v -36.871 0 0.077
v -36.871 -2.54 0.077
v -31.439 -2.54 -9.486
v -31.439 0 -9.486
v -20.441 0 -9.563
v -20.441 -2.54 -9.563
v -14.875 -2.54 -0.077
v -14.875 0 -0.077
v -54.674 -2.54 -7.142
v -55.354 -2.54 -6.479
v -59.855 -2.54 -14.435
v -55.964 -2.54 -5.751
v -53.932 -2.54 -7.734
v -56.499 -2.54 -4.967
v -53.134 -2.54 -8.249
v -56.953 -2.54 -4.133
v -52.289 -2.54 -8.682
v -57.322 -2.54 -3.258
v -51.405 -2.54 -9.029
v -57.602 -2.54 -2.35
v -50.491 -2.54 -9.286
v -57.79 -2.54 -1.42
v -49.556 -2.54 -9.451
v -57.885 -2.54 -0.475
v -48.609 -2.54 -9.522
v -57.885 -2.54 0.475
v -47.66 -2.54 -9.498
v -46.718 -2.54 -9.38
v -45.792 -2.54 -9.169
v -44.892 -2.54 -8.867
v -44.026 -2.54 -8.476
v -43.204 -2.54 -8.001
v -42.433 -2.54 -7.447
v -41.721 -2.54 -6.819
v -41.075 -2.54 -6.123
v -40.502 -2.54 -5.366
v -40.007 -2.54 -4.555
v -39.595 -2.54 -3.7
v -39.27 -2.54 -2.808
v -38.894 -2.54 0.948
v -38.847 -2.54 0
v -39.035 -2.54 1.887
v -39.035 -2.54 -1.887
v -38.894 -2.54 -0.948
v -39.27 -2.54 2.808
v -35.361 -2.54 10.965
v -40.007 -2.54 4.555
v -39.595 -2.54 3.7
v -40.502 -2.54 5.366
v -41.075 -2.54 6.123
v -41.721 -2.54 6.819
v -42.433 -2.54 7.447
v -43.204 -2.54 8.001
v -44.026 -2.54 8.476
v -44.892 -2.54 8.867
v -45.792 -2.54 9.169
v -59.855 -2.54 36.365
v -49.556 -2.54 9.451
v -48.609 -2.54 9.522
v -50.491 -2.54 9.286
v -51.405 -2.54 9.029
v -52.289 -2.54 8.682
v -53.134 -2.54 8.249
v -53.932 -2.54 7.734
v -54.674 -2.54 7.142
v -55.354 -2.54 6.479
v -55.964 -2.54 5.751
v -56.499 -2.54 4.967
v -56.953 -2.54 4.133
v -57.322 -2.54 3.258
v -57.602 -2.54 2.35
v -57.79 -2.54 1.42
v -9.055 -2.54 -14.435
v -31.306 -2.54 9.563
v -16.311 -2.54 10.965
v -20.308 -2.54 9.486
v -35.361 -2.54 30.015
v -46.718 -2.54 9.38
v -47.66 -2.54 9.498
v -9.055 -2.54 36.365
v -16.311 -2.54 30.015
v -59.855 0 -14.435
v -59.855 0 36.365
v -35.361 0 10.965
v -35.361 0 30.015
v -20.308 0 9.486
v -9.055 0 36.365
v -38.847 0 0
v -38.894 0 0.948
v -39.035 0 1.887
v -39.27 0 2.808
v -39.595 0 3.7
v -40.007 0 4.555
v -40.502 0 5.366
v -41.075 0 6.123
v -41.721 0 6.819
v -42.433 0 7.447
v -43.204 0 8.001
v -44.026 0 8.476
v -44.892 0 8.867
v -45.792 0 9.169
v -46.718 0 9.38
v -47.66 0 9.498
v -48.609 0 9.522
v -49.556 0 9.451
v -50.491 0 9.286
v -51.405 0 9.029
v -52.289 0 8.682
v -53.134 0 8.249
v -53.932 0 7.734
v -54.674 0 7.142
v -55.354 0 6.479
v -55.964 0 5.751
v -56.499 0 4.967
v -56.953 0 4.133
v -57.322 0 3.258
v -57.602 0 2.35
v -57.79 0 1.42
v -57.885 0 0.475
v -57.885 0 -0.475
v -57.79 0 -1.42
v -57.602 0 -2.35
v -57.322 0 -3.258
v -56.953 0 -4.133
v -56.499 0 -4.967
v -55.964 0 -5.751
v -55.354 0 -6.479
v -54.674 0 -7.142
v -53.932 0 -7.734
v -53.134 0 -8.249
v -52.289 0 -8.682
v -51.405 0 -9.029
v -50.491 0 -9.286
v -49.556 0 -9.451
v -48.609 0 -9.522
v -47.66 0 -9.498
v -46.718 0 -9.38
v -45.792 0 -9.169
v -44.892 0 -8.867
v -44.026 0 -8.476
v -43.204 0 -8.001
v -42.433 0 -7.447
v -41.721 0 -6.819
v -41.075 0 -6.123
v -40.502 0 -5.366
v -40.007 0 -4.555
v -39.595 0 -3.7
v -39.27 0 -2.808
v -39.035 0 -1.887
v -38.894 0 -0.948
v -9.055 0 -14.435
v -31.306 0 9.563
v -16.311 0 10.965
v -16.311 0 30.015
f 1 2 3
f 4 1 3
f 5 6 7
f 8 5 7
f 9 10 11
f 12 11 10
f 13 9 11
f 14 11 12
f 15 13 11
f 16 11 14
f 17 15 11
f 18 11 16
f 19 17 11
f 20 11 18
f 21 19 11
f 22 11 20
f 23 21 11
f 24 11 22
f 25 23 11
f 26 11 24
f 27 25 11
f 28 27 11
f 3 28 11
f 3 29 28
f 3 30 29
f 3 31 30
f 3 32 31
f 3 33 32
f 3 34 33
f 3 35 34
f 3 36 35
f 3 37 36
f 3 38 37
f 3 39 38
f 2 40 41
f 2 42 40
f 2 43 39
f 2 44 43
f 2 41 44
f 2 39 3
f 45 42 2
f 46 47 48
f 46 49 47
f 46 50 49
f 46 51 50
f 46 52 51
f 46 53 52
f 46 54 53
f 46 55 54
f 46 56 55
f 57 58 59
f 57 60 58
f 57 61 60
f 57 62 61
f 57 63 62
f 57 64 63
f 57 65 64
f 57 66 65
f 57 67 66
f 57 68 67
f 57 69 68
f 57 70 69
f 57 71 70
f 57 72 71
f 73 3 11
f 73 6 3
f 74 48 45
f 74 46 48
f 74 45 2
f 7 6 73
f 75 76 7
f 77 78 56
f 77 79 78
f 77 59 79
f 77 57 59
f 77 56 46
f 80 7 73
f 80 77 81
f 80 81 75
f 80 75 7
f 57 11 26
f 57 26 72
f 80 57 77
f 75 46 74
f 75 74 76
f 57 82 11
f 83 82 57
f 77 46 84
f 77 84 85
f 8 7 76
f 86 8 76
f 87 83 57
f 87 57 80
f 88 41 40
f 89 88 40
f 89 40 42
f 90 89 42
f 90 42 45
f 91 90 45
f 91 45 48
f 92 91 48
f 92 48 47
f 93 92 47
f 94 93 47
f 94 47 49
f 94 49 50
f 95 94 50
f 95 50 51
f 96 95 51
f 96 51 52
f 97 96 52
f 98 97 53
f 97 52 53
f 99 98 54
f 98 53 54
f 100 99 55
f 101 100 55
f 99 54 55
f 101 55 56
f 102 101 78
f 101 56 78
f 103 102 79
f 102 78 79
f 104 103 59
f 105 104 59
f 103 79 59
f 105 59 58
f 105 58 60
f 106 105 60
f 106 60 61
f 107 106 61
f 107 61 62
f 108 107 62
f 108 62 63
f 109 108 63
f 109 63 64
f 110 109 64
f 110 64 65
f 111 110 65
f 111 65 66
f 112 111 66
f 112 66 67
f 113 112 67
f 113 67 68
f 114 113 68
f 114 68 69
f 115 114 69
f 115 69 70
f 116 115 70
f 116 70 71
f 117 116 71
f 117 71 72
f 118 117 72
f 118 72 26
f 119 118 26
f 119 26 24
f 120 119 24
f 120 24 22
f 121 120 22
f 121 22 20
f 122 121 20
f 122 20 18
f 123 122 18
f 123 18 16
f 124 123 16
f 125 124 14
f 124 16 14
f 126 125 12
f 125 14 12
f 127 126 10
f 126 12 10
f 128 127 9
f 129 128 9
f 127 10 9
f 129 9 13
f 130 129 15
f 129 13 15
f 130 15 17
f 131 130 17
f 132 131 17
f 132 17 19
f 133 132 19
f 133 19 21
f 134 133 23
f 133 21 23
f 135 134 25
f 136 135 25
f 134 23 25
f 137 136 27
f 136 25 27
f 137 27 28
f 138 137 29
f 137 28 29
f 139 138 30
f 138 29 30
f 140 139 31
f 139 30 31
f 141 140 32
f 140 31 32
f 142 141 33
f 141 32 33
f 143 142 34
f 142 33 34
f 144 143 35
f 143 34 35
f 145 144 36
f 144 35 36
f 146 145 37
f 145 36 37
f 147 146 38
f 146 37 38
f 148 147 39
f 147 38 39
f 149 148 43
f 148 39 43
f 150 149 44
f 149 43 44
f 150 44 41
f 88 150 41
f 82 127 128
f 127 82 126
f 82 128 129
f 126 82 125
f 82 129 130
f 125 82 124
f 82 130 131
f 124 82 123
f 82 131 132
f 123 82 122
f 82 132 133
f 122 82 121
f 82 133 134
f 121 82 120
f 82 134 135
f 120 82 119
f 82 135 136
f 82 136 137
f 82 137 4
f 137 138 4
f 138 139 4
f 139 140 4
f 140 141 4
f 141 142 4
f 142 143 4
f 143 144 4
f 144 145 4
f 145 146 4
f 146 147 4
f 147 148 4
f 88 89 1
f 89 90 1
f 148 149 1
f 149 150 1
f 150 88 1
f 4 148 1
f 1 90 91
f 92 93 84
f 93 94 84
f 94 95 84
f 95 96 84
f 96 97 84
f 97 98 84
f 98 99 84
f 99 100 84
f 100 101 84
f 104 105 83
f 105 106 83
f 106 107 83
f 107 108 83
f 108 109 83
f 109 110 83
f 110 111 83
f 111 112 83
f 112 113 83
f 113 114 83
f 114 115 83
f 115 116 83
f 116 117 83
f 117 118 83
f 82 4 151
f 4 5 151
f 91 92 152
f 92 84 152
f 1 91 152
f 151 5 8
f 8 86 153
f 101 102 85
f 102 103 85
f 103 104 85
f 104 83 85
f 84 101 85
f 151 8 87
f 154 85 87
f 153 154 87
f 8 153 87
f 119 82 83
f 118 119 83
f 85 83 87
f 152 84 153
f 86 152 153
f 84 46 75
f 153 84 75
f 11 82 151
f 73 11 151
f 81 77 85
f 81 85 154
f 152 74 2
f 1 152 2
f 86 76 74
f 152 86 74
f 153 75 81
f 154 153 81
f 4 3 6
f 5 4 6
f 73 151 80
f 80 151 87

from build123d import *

# Parameters (mm, degrees)
F0_W     = 50.8
F0_H     = 50.8
F1_DEPTH = 2.54
F2_W     = 19.05
F2_H     = 19.05
F2_R     = 9.525
F3_DEPTH = 25.4


with BuildPart() as f1:
    # F0 (on Front) → F1 (new body)
    with BuildSketch(Plane.XZ):
        with Locations((-34.454534, 10.964983)):
            Rectangle(F0_W, F0_H)
    extrude(amount=F1_DEPTH)

    # F2 (on face) → F3 (cut)
    with BuildSketch(Plane.XZ.offset(2.54)):
        with Locations((-25.836355, 20.489983)):
            Rectangle(F2_W, F2_H)
        with Locations((-48.371602, 0)):
            Circle(F2_R)
        Polygon((-14.874928, -0.076784), (-20.307559, 9.486376), (-31.305813, 9.56316), (-36.871437, 0.076784), (-31.438806, -9.486376), (-20.440552, -9.56316), align=None)
    extrude(amount=-F3_DEPTH, mode=Mode.SUBTRACT)


solid = f1.part
